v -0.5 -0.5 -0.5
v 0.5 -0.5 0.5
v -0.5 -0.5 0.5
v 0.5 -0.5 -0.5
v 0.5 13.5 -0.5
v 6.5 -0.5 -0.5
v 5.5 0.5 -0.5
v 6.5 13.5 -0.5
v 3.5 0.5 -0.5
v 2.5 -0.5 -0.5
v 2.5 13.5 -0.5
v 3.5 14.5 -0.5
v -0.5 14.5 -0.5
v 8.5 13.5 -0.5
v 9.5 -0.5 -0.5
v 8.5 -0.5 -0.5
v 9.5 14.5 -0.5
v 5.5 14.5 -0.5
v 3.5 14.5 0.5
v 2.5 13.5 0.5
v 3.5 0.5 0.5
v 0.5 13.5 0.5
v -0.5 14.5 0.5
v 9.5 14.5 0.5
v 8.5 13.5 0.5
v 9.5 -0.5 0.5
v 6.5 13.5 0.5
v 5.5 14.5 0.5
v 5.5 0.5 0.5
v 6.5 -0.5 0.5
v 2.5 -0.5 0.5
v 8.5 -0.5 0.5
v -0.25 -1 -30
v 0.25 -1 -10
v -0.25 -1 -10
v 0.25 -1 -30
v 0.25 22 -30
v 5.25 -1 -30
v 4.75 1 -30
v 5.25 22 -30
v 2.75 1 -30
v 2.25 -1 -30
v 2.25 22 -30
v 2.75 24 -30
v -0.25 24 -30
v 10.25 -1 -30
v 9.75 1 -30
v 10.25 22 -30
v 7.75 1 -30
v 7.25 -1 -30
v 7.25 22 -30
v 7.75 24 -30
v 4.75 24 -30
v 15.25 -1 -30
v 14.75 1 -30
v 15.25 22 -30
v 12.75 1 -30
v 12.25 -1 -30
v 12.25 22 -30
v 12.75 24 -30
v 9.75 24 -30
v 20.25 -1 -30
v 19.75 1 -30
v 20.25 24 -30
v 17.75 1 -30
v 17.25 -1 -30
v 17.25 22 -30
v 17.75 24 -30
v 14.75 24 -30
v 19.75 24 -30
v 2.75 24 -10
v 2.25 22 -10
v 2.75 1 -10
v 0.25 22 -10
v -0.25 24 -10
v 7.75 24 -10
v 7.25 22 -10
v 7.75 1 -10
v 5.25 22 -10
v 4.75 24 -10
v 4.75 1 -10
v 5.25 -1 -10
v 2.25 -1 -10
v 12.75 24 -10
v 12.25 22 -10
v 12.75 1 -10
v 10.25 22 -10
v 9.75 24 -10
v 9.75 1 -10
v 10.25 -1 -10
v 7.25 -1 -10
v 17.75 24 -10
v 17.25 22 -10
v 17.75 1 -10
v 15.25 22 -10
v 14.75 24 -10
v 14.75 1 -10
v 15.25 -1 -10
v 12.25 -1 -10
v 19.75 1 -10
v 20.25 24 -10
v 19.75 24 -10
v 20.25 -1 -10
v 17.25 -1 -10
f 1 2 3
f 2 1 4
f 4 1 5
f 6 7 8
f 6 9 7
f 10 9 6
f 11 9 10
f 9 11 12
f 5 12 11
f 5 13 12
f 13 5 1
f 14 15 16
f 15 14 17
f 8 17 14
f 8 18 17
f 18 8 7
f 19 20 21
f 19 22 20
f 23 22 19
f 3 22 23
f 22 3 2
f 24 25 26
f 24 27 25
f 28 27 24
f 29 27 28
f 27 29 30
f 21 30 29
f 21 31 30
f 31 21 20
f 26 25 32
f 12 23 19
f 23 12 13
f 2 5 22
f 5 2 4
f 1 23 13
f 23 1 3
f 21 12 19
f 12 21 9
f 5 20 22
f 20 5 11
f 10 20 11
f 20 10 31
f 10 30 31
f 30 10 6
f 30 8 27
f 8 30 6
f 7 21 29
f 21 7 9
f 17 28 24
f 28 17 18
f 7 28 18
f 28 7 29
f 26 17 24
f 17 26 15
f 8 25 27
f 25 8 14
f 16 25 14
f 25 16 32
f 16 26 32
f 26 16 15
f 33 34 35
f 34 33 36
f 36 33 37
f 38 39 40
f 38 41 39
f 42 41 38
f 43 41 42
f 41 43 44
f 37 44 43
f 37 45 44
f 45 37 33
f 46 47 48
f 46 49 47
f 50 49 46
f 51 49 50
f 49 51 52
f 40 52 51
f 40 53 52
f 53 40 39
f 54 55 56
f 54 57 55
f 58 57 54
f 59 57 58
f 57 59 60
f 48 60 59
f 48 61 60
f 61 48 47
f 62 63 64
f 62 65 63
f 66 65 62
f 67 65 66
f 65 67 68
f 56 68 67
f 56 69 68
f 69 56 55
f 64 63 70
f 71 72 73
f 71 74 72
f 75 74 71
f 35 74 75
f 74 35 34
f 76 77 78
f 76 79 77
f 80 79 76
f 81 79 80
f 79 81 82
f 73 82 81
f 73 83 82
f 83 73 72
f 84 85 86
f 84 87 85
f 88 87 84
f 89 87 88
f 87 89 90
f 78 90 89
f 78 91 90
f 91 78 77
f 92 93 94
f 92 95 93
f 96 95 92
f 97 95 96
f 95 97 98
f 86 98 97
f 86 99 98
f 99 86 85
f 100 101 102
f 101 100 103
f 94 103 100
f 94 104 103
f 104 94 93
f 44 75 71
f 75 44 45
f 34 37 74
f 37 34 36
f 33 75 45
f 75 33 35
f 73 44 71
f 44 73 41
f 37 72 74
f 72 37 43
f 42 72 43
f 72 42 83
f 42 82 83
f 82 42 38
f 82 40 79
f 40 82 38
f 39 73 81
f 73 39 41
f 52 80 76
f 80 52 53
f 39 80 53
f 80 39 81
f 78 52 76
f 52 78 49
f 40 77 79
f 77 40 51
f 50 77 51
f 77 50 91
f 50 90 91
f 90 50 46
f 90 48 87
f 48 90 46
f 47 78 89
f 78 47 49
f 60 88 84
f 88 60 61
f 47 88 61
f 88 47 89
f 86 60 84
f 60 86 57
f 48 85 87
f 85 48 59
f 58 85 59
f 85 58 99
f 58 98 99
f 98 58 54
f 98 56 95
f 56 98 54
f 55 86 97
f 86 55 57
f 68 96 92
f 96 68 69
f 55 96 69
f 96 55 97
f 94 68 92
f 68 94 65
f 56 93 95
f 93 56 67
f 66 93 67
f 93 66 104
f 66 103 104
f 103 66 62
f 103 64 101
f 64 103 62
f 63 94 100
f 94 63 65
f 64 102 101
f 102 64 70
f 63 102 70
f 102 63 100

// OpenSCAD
// file: polychannel.scad
/*--------------------------------------------------------------------------------------
/ General purpose multi-segment channel module: polychannel.
/
/ Given a list of sizes and positions, a series of connected channels is constructed
/ using the hull() operation to connect sequential pairs of cubes with specified
/ size and position as given in the sizes and positions list.
/
/ Rev. 1, 9/28/22, by G. Nordin
--------------------------------------------------------------------------------------*/

module shape3D(size, position, center=true) {
    translate(position) cube(size, center=center);
}

// See https://forum.openscad.org/Calculating-Summarize-Arrays-generate-Array-td29132.html
function partial_sum(v, n, r = 0) = n <= 0 
        ? r + v[0] 
        : partial_sum(v, n - 1, r + v[n]); 

function partial_sum_vectors(v, n, r = [0,0,0]) = partial_sum(v, n, r); 

/*
// Tests for partial_sum and partial_sum_vectors
dim = [10, 8, 2, 25, 5]; 
n = len(dim); 
x_pos = [for(i = [0:n-1]) partial_sum(dim, i)]; 
echo(x_pos); // ECHO: [10, 18, 20, 45, 50] 
echo("");
dim2 = [[10, 1], [8, 1], [2, 1], [25, 1], [5, 2]]; 
n2 = len(dim2); 
x_pos2 = [for(i = [0:n2-1]) partial_sum_vectors(dim2, i)]; 
echo(x_pos2); // ECHO: [[10, 1], [18, 2], [20, 3], [45, 4], [50, 6]]
echo("");
x_pos3 = [for(i = [0:n2-1]) partial_sum(dim2, i, [0,0,0])]; 
echo(x_pos3); // ECHO: [[10, 1], [18, 2], [20, 3], [45, 4], [50, 6]]
echo("");
*/

module polychannel_absolute_positions(sizes, positions, clr="lightblue", center=true, show_only_shapes=false) {
    if (show_only_shapes) {
        for (i = [0:len(sizes)-1]) {
            color(clr) shape3D(sizes[i], positions[i]);
        }
    } else {
        for (i = [1:len(sizes)-1]) {
            color(clr) hull() {
                shape3D(sizes[i-1], positions[i-1]);
                shape3D(sizes[i], positions[i]);
            };
        };
    }
}

module polychannel(sizes, positions, relative_positions=false, clr="lightblue", center=true, show_only_shapes=false) {
    assert(len(sizes) == len(positions), "polychannel: sizes and positions arrays must have the same length");
    if (relative_positions) {
        absolute_positions = [for(i = [0:len(sizes)-1]) partial_sum_vectors(positions, i)];
        polychannel_absolute_positions(sizes, absolute_positions, clr=clr, center=center, show_only_shapes=show_only_shapes);
    } else {
        polychannel_absolute_positions(sizes, positions, clr=clr, center=center, show_only_shapes=show_only_shapes);
    }
}


// Example usage - see polychannel_result.png for output

size1 = [1, 1, 1];

sizes = [
    size1,
    [0.1, 1, 1],
    5 * size1,
    [2, 0.1, 2],
    2 * size1,
    2 * size1,
    size1,
    size1,
    size1
];
positions = [
    [0, 0, 0],
    [10, 0, 0],
    [20, 0, 0],
    [20, 8, 0],
    [20, 15, 0],
    [20, 15, 10],
    [16, 15, 9.5],
    [8, 15, 2],
    [0, 15, 2]
];
relative_positions = [
    [0, 0, 0],  // All subsequent positions are relative to this position
    [10, 0, 0],
    [10, 0, 0],
    [0, 8, 0],
    [0, 7, 0],
    [0, 0, 10],
    [-4, 0, -0.5],
    [-8, 0, -7.5],
    [-8, 0, 0]
];

polychannel(sizes, positions, clr="red", show_only_shapes=true);

translate([0, -25, 0]) polychannel(sizes, positions, clr="Salmon");

translate([0, 25, 0]) polychannel(sizes, relative_positions, relative_positions=true);
// main file
/*--------------------------------------------------------------------------------------
/ Serpentine channel module based on the polychannel module.
/
/ Serpentine long channel axis is y. As more long channel segments are added,
/ the serpentine channel grows in x.
/
/ Rev. 1, 9/28/22, by G. Nordin
--------------------------------------------------------------------------------------*/
use <polychannel.scad>

function serp_rel_x_pos(n, lx) = n == 0
    ? 0
    : lx * ((n+1) % 2);

function sign(n) = (n+1) % 4 == 0
    ? -1
    : 1;

function serp_rel_y_pos(n, ly) = ly * (n%2) * sign(n);

echo([for (i = [0:1:7]) serp_rel_x_pos(i, 2)]);
echo([for (i = [0:1:7]) sign(i)]);
echo([for (i = [0:1:7]) serp_rel_y_pos(i, 3)]);
echo([for (i = [0:1:7]) [serp_rel_x_pos(i, 2), serp_rel_y_pos(i, 3), 0]]);


module serpentine_channel(
    n = 4,              // Number of serpentine segments
    l = 15,             // Length of serpentine segment
    size = [1, 1, 1],   // Size of channel in x,y,z
    gap = 2,            // Gap between serpentine segments
    clr = "lightblue"   // Color
) {
    n_serp_segments = n;
    n_gap_segments = n_serp_segments - 1;
    n_positions = n_serp_segments + n_gap_segments + 1;
    // echo("n_serp_segments:", n_serp_segments);
    // echo("n_gap_segments:", n_gap_segments);
    // echo("n_positions:", n_positions);
    sizes = [for (i= [0: 1: n_positions-1]) size];
    // echo(sizes);

    lx = gap + size[0];
    ly = l - size[1];
    // echo("lx, ly", lx, ly);
    positions = [for (i= [0: 1: n_positions-1]) [serp_rel_x_pos(i, lx), serp_rel_y_pos(i, ly), 0]];
    // echo(positions);

    polychannel(sizes, positions, relative_positions=true, clr=clr);
}

// Example usage - see serpentine_result.png for output
serpentine_channel();
size = [0.5, 2, 20];
translate([0, 0, -20]) serpentine_channel(n=9, l=25, size=size, clr="Salmon");
echo("");
